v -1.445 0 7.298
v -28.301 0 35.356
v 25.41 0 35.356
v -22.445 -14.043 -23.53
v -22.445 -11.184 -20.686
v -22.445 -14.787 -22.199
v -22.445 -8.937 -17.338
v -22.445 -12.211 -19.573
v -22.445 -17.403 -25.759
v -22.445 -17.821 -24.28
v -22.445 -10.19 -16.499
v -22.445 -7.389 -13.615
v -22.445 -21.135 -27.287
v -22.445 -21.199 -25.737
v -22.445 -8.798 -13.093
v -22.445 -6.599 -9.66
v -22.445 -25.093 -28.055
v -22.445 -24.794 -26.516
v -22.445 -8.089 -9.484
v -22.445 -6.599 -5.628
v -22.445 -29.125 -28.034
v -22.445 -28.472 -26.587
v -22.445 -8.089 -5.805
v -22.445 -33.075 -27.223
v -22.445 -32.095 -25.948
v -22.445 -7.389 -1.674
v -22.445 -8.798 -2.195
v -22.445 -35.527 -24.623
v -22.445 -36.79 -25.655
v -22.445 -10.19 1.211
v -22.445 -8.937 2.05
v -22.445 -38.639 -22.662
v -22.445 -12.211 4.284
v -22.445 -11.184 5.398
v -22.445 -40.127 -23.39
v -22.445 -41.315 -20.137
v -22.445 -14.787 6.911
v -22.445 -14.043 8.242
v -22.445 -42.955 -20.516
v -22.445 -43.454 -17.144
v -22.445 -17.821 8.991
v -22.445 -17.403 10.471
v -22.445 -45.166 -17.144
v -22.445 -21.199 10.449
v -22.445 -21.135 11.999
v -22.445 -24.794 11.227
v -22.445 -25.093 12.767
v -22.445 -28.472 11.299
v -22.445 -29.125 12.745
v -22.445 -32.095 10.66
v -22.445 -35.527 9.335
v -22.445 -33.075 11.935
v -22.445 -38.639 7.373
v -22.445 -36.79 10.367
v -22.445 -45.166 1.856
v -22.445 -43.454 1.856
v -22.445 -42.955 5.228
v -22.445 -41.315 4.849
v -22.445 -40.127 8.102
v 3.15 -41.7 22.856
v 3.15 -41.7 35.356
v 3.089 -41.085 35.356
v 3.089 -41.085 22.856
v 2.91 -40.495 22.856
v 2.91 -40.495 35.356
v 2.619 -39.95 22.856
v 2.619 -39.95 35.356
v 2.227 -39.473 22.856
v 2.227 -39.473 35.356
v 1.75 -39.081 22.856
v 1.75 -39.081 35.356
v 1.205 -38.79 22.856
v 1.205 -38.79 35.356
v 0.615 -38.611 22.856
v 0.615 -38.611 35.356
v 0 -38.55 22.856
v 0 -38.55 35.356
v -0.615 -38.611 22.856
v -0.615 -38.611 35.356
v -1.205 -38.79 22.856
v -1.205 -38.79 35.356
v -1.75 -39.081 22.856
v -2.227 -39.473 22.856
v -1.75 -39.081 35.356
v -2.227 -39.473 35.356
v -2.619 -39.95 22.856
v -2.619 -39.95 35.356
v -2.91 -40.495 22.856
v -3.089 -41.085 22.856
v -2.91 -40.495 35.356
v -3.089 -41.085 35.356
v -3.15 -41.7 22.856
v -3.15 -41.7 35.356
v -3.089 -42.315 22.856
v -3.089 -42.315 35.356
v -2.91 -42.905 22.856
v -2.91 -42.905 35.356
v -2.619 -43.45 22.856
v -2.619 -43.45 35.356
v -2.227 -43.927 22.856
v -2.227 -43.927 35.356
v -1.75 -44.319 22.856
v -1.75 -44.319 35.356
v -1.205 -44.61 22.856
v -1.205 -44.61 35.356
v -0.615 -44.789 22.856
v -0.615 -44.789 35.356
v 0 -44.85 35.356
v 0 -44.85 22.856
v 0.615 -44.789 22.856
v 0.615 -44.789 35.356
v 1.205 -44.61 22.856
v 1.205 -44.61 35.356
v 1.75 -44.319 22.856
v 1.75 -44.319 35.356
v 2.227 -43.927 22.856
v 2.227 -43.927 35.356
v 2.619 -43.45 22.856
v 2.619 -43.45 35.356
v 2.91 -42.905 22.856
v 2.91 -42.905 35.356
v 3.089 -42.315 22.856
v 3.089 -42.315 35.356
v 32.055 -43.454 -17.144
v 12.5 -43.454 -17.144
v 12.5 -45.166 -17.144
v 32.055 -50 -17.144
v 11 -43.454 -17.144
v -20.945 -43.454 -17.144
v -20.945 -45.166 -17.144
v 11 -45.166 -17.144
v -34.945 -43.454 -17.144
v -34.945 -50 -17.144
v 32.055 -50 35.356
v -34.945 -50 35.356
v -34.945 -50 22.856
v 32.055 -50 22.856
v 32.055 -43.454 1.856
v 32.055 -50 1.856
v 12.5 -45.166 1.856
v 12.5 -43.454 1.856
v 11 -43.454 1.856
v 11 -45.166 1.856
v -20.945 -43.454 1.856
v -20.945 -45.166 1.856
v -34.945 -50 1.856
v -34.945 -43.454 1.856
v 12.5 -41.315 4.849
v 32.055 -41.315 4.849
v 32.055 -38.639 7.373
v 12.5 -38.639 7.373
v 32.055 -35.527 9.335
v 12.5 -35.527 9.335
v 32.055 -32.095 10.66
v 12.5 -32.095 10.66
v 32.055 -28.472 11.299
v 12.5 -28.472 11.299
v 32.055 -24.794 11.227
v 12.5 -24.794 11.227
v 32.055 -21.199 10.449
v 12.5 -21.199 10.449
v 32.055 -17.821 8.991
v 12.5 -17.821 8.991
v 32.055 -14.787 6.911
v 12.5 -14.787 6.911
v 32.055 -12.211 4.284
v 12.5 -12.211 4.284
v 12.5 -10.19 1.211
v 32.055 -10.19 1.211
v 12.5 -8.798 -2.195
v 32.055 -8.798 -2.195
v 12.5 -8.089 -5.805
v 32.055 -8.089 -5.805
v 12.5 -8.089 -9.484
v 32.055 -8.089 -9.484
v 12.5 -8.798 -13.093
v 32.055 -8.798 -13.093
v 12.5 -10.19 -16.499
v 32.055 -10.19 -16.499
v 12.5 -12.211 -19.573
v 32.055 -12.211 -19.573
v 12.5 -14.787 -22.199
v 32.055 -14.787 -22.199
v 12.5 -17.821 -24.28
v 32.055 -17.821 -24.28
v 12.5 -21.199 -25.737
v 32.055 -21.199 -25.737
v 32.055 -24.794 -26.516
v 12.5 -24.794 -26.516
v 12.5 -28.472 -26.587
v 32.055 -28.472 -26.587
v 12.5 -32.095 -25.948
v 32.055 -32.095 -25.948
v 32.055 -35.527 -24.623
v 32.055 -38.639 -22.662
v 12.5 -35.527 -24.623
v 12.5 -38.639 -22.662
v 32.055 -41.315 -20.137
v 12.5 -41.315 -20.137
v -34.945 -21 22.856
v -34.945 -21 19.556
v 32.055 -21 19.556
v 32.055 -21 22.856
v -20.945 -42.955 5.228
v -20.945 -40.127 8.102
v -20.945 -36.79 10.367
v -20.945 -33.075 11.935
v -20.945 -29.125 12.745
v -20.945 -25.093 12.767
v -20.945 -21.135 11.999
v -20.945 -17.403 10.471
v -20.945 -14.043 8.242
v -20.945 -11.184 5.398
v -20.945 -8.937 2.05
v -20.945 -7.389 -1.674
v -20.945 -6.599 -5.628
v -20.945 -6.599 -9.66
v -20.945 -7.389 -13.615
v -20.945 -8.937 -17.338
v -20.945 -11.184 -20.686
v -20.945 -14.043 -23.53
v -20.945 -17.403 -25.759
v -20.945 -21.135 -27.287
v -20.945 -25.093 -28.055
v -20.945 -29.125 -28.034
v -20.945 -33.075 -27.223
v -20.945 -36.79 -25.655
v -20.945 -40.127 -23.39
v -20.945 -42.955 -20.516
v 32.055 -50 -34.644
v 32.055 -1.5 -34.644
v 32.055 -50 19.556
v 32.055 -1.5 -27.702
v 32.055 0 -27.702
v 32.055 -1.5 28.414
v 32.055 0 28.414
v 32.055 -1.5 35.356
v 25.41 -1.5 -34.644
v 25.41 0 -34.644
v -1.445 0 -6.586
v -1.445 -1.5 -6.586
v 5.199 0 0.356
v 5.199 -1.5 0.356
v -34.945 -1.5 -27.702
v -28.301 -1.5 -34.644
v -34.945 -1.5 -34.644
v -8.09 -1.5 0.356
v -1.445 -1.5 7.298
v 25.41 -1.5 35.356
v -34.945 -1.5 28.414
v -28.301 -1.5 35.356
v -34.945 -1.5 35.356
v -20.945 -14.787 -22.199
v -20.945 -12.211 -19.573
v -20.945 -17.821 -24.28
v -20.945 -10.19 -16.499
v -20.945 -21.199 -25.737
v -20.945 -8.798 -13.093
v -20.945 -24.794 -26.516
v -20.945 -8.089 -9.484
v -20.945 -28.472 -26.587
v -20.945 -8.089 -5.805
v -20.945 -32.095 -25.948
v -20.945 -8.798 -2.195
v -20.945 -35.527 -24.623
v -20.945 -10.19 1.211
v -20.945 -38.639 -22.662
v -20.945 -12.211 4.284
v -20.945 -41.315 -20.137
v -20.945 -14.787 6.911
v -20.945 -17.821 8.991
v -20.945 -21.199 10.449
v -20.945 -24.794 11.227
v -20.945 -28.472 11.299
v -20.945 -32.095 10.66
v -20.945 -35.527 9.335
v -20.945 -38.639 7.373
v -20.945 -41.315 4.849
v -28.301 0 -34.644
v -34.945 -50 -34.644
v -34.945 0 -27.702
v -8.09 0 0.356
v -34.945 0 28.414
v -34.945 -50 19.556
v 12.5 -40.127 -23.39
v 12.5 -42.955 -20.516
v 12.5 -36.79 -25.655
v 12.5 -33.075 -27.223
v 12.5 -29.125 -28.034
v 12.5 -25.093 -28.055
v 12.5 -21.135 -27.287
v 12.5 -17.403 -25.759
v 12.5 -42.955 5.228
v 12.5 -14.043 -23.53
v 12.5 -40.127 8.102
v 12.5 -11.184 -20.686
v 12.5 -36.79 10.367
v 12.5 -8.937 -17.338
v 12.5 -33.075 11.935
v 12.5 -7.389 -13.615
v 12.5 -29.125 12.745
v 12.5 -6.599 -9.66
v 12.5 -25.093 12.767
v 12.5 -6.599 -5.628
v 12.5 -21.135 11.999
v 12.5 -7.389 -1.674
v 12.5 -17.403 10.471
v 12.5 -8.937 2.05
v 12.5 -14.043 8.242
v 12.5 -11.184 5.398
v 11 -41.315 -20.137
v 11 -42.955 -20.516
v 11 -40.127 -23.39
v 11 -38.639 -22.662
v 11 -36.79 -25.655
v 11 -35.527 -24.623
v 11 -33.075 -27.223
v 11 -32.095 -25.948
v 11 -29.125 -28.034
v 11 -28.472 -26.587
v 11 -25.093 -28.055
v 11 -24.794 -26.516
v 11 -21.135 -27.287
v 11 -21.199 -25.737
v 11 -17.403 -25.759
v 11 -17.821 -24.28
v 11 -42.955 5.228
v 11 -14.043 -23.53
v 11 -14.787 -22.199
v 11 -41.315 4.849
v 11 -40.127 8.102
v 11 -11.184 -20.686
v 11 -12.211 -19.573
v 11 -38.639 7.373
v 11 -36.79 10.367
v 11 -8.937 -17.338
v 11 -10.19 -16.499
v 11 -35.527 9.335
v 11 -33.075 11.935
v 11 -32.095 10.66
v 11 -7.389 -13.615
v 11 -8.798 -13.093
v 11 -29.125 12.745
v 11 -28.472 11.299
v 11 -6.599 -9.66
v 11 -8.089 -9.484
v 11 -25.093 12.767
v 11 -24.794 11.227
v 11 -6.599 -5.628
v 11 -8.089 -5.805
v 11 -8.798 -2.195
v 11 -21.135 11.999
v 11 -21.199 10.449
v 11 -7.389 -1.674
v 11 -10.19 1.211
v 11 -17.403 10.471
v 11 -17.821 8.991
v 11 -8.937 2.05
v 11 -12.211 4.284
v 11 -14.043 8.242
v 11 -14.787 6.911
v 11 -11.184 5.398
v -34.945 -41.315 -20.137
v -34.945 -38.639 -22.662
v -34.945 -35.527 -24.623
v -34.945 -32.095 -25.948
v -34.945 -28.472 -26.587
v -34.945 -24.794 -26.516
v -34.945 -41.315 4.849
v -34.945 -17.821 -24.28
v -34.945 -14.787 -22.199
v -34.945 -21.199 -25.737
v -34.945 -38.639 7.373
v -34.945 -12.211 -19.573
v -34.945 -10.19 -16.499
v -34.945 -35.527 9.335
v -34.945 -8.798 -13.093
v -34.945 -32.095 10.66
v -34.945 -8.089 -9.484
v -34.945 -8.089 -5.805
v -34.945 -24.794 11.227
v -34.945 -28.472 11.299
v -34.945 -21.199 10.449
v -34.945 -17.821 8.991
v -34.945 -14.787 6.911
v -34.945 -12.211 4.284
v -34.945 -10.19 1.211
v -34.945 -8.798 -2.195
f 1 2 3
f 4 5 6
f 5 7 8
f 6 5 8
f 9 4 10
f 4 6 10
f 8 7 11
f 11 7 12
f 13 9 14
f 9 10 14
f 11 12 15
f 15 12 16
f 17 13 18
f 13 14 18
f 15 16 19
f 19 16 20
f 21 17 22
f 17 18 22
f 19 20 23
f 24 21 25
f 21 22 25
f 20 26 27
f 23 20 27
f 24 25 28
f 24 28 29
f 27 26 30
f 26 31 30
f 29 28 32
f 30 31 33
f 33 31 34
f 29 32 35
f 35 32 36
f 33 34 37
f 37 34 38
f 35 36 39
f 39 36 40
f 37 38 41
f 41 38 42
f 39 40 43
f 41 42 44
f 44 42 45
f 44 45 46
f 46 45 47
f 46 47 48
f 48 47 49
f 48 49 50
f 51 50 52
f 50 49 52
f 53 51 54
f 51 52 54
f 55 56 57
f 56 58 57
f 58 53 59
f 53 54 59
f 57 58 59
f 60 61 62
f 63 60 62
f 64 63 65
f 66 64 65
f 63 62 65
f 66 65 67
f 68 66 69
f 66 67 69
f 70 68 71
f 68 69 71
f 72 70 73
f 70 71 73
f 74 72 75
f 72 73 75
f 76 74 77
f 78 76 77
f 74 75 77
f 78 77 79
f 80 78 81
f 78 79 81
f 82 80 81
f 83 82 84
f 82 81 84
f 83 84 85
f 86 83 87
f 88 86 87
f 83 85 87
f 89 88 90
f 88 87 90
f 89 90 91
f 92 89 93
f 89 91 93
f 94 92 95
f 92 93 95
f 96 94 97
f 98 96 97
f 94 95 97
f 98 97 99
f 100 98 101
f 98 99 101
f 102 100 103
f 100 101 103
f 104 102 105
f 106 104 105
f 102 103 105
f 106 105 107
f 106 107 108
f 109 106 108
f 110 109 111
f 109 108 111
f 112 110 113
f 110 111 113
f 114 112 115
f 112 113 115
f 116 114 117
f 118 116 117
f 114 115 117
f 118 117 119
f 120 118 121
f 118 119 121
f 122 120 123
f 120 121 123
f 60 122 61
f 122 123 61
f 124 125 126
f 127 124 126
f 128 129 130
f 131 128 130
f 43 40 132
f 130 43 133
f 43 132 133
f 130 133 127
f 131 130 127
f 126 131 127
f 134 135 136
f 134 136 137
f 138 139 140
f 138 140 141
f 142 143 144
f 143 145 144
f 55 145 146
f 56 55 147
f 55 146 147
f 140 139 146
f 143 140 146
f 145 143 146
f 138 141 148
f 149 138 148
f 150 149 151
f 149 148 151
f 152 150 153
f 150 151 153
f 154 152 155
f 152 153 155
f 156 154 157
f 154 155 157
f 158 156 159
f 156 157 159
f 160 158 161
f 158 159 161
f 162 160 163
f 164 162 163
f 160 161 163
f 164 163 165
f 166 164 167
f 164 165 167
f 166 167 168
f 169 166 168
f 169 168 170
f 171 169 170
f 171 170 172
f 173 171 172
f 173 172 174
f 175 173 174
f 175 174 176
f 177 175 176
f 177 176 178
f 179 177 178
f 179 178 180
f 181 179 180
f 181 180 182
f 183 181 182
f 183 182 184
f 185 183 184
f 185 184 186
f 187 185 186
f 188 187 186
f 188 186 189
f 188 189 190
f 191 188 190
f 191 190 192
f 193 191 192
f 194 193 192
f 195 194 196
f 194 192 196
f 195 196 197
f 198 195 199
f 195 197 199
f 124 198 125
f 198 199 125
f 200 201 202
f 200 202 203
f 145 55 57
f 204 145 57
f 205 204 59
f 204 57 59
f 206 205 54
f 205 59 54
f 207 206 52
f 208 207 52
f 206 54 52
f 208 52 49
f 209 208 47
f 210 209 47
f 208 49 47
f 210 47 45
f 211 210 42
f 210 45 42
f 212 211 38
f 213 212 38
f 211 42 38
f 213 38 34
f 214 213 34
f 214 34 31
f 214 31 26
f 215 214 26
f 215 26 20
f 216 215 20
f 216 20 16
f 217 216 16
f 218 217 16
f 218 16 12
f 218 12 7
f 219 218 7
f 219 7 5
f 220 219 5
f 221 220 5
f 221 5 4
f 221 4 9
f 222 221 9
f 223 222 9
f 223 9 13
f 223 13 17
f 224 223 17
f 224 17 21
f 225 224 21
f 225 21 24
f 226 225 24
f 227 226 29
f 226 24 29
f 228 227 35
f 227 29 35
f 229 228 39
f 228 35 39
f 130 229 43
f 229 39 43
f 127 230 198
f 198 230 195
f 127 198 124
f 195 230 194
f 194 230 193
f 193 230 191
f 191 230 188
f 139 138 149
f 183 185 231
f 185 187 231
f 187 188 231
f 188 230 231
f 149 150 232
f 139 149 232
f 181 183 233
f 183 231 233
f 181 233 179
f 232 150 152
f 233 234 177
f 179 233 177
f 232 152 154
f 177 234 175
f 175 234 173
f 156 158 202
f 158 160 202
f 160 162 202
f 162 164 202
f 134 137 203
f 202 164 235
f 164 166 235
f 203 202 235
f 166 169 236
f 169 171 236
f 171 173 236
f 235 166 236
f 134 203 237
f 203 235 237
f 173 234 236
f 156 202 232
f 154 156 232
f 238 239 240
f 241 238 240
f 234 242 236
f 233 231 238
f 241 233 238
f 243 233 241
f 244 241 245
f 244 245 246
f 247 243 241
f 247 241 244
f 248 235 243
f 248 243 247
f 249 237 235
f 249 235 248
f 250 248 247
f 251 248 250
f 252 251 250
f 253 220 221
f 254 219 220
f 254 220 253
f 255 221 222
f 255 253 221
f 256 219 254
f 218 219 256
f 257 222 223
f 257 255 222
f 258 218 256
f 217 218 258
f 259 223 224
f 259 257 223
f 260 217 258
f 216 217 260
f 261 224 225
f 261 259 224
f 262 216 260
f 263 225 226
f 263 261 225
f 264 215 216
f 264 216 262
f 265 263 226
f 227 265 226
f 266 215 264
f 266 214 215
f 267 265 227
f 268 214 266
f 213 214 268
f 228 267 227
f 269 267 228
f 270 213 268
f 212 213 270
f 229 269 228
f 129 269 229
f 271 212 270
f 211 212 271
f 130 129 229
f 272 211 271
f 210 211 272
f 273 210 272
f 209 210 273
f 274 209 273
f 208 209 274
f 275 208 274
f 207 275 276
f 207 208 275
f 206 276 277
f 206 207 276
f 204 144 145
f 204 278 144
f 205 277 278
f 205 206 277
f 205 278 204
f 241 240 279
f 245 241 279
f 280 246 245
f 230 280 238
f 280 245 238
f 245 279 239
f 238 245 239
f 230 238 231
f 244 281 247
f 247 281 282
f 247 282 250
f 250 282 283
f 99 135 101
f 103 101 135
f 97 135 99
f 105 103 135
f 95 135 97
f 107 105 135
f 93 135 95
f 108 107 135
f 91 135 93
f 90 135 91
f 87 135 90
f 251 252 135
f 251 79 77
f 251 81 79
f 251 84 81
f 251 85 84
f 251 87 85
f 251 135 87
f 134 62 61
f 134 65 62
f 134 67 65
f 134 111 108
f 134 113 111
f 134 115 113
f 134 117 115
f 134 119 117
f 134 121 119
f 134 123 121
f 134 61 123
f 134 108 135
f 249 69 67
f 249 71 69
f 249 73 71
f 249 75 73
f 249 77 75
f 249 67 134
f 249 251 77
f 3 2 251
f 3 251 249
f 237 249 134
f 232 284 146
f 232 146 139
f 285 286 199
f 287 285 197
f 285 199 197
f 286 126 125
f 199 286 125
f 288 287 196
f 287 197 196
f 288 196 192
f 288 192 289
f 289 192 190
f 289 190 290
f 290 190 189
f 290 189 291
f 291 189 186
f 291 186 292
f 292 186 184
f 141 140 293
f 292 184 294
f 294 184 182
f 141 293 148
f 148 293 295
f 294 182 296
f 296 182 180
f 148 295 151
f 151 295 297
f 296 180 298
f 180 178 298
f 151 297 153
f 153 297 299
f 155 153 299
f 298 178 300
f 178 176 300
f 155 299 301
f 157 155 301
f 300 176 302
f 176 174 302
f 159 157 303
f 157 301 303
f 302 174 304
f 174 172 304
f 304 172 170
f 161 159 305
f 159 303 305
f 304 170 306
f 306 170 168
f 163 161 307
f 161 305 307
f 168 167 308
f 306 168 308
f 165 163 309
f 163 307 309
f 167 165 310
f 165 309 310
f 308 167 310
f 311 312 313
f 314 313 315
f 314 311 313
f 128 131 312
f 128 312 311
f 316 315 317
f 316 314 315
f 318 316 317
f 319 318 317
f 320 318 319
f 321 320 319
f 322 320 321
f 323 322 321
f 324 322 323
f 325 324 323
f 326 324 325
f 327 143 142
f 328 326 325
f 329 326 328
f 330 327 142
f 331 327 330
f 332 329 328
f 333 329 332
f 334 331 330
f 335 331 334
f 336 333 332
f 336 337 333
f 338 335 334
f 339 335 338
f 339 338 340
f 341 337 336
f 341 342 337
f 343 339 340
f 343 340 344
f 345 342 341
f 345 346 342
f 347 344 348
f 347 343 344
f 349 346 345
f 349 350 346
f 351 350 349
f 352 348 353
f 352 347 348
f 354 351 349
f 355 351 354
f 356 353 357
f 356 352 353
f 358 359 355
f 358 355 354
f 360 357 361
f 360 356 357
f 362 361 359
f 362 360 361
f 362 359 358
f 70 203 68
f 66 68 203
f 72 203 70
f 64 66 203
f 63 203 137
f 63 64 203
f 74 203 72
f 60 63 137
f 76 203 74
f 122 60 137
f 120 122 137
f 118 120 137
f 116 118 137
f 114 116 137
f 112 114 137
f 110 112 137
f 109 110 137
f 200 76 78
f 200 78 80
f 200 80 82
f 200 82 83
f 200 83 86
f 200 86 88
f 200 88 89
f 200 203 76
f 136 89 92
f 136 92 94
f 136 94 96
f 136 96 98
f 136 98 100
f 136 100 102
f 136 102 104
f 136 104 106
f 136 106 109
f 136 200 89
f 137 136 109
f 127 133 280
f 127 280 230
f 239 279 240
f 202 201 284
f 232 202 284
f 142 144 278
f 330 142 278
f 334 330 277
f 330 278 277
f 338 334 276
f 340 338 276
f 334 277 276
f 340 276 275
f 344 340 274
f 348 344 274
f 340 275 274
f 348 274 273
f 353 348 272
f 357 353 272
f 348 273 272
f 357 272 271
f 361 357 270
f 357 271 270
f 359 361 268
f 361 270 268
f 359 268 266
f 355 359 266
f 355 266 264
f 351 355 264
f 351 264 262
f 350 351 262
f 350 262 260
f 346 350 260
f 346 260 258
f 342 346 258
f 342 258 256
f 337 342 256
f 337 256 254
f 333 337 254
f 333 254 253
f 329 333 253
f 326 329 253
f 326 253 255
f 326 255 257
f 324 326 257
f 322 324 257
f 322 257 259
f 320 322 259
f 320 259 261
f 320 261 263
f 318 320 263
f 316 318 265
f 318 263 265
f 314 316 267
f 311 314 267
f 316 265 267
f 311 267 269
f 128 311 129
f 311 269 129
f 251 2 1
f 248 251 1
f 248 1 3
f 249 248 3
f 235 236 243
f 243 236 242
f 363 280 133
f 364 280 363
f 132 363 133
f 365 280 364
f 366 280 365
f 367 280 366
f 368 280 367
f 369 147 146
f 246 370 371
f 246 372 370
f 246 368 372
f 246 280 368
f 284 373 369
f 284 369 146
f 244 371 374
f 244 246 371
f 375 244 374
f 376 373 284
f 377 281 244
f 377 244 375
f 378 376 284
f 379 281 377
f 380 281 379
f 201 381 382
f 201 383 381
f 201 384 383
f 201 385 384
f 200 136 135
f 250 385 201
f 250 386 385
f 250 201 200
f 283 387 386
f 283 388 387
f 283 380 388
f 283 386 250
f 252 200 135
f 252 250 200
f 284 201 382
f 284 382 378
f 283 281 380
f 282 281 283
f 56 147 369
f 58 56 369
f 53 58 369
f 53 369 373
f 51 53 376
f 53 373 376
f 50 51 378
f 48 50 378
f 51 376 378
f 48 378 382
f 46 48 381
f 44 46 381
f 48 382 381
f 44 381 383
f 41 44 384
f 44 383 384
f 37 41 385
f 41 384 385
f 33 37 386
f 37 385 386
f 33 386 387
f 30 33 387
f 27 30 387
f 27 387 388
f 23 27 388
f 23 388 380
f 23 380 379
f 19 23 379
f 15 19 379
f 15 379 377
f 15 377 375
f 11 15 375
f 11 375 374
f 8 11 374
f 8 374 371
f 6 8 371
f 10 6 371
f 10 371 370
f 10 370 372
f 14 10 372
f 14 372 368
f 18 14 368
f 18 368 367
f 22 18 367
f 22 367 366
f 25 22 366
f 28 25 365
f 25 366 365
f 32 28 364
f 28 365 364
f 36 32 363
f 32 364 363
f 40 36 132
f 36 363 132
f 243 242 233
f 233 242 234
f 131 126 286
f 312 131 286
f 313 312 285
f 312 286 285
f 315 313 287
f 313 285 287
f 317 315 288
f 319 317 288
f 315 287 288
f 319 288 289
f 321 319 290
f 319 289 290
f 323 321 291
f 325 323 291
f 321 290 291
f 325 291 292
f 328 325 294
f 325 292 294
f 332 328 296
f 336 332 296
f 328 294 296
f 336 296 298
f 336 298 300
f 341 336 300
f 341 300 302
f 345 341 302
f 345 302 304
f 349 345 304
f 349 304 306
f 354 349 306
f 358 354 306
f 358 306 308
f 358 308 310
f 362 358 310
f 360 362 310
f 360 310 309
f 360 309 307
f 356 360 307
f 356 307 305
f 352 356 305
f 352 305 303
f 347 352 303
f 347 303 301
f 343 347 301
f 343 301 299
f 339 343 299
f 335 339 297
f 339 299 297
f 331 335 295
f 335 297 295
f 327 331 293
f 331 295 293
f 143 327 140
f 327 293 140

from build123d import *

# Parameters (mm, degrees)
F0_W      = 67
F0_H      = 70
F1_DEPTH  = 50
F3_DEPTH  = 1.5
F5_DEPTH  = 67
F7_R      = 20.5
F8_DEPTH  = 1.5
F9_W      = 29
F9_H      = 3.3
F10_DEPTH = 67
F12_R     = 20.5
F13_DEPTH = 1.5
F14_R     = 3.15
F15_DEPTH = 12.5


with BuildPart() as f1:
    # F0 (on Front) → F1 (new body)
    with BuildSketch(Plane.XZ):
        with Locations((-1.4453364354, 0.3557987511)):
            Rectangle(F0_W, F0_H)
    extrude(amount=F1_DEPTH)

    # F2 (on face) → F3 (cut)
    with BuildSketch(Plane(origin=(0, 0, 0), x_dir=(-1, 0, 0), z_dir=(0, 1, 0))):
        Polygon((-32.0546635646, -27.7023371982), (-32.0546635646, -34.6442012489), (-1.8768413603, -3.1151332742), (-5.199019156, 0.3557987511), align=None)
        Polygon((-1.8768413603, -3.1151332742), (-32.0546635646, -34.6442012489), (-25.4103079732, -34.6442012489), (1.4453364354, -6.5860652996), align=None)
        Polygon((-5.199019156, 0.3557987511), (-1.8768413603, -3.1151332742), (1.4453364354, 0.3557987511), (-1.8768413603, 3.8267307765), align=None)
        Polygon((1.4453364354, 0.3557987511), (-1.8768413603, -3.1151332742), (1.4453364354, -6.5860652996), (4.7675142311, -3.1151332742), align=None)
        Polygon((-1.8768413603, 3.8267307765), (1.4453364354, 0.3557987511), (4.7675142311, 3.8267307765), (1.4453364354, 7.2976628018), align=None)
        Polygon((4.7675142311, 3.8267307765), (1.4453364354, 0.3557987511), (4.7675142311, -3.1151332742), (8.0896920268, 0.3557987511), align=None)
        Polygon((-32.0546635646, 28.4139347004), (-5.199019156, 0.3557987511), (-1.8768413603, 3.8267307765), (-32.0546635646, 35.3557987511), align=None)
        Polygon((34.9453364354, 35.3557987511), (4.7675142311, 3.8267307765), (8.0896920268, 0.3557987511), (34.9453364354, 28.4139347004), align=None)
        Polygon((8.0896920268, 0.3557987511), (4.7675142311, -3.1151332742), (34.9453364354, -34.6442012489), (34.9453364354, -27.7023371982), align=None)
        Polygon((-32.0546635646, 35.3557987511), (-1.8768413603, 3.8267307765), (1.4453364354, 7.2976628018), (-25.4103079732, 35.3557987511), align=None)
        Polygon((1.4453364354, 7.2976628018), (4.7675142311, 3.8267307765), (34.9453364354, 35.3557987511), (28.300980844, 35.3557987511), align=None)
        Polygon((4.7675142311, -3.1151332742), (1.4453364354, -6.5860652996), (28.300980844, -34.6442012489), (34.9453364354, -34.6442012489), align=None)
    extrude(amount=-F3_DEPTH, mode=Mode.SUBTRACT)

    # F4 (on face) → F5 (cut, through all)
    with BuildSketch(Plane(origin=(-34.9453364354, 0, 0), x_dir=(0, -1, 0), z_dir=(-1, 0, 0))):
        with BuildLine():
            ThreePointArc((43.4544826719, 1.8557987511), (45.3525906995, -2.7266393919), (46, -7.6442012489))
            Line((46, -7.6442012489), (46.011290825, -7.6442012489))
            ThreePointArc((46.011290825, -7.6442012489), (45.3609147785, -2.7251752291), (43.4544826719, 1.8557987511))
        make_face()
        with BuildLine():
            Line((46.011290825, -7.6442012489), (46, -7.6442012489))
            ThreePointArc((46, -7.6442012489), (45.3525906995, -12.5617631058), (43.4544826719, -17.1442012489))
            ThreePointArc((43.4544826719, -17.1442012489), (45.3609147785, -12.5632272686), (46.011290825, -7.6442012489))
        make_face()
        with BuildLine():
            Line((50, 1.8557987511), (43.4544826719, 1.8557987511))
            ThreePointArc((43.4544826719, 1.8557987511), (45.3609147785, -2.7251752291), (46.011290825, -7.6442012489))
            Line((46.011290825, -7.6442012489), (50, -7.6442012489))
            Line((50, -7.6442012489), (50, 1.8557987511))
        make_face()
        with BuildLine():
            ThreePointArc((43.4544826719, -17.1442012489), (45.3525906995, -12.5617631058), (46, -7.6442012489))
            ThreePointArc((46, -7.6442012489), (45.3525906995, -2.7266393919), (43.4544826719, 1.8557987511))
            ThreePointArc((43.4544826719, 1.8557987511), (8, -7.6442012489), (43.4544826719, -17.1442012489))
        make_face()
        with BuildLine():
            ThreePointArc((46.011290825, -7.6442012489), (45.3609147785, -12.5632272686), (43.4544826719, -17.1442012489))
            Line((43.4544826719, -17.1442012489), (50, -17.1442012489))
            Line((50, -17.1442012489), (50, -7.6442012489))
            Line((50, -7.6442012489), (46.011290825, -7.6442012489))
        make_face()
    extrude(amount=-F5_DEPTH, mode=Mode.SUBTRACT)

    # F7 (on offset) → F8 (cut)
    with BuildSketch(Plane.YZ.offset(12.5)):
        with Locations((-27, -7.6442012489)):
            Circle(F7_R)
    extrude(amount=-F8_DEPTH, mode=Mode.SUBTRACT)

    # F9 (on face) → F10 (cut, through all)
    with BuildSketch(Plane(origin=(-34.9453364354, 0, 0), x_dir=(0, -1, 0), z_dir=(-1, 0, 0))):
        with Locations((35.5, 21.2057987511)):
            Rectangle(F9_W, F9_H)
    extrude(amount=-F10_DEPTH, mode=Mode.SUBTRACT)

    # F12 (on offset) → F13 (cut)
    with BuildSketch(Plane(origin=(-22.4453364354, 0, 0), x_dir=(0, -1, 0), z_dir=(-1, 0, 0))):
        with Locations((27, -7.6442012489)):
            Circle(F12_R)
    extrude(amount=-F13_DEPTH, mode=Mode.SUBTRACT)

    # F14 (on face) → F15 (cut, through all)
    with BuildSketch(Plane.XY.offset(35.3557987511)):
        with Locations((0, -41.7)):
            Circle(F14_R)
    extrude(amount=-F15_DEPTH, mode=Mode.SUBTRACT)


solid = f1.part
